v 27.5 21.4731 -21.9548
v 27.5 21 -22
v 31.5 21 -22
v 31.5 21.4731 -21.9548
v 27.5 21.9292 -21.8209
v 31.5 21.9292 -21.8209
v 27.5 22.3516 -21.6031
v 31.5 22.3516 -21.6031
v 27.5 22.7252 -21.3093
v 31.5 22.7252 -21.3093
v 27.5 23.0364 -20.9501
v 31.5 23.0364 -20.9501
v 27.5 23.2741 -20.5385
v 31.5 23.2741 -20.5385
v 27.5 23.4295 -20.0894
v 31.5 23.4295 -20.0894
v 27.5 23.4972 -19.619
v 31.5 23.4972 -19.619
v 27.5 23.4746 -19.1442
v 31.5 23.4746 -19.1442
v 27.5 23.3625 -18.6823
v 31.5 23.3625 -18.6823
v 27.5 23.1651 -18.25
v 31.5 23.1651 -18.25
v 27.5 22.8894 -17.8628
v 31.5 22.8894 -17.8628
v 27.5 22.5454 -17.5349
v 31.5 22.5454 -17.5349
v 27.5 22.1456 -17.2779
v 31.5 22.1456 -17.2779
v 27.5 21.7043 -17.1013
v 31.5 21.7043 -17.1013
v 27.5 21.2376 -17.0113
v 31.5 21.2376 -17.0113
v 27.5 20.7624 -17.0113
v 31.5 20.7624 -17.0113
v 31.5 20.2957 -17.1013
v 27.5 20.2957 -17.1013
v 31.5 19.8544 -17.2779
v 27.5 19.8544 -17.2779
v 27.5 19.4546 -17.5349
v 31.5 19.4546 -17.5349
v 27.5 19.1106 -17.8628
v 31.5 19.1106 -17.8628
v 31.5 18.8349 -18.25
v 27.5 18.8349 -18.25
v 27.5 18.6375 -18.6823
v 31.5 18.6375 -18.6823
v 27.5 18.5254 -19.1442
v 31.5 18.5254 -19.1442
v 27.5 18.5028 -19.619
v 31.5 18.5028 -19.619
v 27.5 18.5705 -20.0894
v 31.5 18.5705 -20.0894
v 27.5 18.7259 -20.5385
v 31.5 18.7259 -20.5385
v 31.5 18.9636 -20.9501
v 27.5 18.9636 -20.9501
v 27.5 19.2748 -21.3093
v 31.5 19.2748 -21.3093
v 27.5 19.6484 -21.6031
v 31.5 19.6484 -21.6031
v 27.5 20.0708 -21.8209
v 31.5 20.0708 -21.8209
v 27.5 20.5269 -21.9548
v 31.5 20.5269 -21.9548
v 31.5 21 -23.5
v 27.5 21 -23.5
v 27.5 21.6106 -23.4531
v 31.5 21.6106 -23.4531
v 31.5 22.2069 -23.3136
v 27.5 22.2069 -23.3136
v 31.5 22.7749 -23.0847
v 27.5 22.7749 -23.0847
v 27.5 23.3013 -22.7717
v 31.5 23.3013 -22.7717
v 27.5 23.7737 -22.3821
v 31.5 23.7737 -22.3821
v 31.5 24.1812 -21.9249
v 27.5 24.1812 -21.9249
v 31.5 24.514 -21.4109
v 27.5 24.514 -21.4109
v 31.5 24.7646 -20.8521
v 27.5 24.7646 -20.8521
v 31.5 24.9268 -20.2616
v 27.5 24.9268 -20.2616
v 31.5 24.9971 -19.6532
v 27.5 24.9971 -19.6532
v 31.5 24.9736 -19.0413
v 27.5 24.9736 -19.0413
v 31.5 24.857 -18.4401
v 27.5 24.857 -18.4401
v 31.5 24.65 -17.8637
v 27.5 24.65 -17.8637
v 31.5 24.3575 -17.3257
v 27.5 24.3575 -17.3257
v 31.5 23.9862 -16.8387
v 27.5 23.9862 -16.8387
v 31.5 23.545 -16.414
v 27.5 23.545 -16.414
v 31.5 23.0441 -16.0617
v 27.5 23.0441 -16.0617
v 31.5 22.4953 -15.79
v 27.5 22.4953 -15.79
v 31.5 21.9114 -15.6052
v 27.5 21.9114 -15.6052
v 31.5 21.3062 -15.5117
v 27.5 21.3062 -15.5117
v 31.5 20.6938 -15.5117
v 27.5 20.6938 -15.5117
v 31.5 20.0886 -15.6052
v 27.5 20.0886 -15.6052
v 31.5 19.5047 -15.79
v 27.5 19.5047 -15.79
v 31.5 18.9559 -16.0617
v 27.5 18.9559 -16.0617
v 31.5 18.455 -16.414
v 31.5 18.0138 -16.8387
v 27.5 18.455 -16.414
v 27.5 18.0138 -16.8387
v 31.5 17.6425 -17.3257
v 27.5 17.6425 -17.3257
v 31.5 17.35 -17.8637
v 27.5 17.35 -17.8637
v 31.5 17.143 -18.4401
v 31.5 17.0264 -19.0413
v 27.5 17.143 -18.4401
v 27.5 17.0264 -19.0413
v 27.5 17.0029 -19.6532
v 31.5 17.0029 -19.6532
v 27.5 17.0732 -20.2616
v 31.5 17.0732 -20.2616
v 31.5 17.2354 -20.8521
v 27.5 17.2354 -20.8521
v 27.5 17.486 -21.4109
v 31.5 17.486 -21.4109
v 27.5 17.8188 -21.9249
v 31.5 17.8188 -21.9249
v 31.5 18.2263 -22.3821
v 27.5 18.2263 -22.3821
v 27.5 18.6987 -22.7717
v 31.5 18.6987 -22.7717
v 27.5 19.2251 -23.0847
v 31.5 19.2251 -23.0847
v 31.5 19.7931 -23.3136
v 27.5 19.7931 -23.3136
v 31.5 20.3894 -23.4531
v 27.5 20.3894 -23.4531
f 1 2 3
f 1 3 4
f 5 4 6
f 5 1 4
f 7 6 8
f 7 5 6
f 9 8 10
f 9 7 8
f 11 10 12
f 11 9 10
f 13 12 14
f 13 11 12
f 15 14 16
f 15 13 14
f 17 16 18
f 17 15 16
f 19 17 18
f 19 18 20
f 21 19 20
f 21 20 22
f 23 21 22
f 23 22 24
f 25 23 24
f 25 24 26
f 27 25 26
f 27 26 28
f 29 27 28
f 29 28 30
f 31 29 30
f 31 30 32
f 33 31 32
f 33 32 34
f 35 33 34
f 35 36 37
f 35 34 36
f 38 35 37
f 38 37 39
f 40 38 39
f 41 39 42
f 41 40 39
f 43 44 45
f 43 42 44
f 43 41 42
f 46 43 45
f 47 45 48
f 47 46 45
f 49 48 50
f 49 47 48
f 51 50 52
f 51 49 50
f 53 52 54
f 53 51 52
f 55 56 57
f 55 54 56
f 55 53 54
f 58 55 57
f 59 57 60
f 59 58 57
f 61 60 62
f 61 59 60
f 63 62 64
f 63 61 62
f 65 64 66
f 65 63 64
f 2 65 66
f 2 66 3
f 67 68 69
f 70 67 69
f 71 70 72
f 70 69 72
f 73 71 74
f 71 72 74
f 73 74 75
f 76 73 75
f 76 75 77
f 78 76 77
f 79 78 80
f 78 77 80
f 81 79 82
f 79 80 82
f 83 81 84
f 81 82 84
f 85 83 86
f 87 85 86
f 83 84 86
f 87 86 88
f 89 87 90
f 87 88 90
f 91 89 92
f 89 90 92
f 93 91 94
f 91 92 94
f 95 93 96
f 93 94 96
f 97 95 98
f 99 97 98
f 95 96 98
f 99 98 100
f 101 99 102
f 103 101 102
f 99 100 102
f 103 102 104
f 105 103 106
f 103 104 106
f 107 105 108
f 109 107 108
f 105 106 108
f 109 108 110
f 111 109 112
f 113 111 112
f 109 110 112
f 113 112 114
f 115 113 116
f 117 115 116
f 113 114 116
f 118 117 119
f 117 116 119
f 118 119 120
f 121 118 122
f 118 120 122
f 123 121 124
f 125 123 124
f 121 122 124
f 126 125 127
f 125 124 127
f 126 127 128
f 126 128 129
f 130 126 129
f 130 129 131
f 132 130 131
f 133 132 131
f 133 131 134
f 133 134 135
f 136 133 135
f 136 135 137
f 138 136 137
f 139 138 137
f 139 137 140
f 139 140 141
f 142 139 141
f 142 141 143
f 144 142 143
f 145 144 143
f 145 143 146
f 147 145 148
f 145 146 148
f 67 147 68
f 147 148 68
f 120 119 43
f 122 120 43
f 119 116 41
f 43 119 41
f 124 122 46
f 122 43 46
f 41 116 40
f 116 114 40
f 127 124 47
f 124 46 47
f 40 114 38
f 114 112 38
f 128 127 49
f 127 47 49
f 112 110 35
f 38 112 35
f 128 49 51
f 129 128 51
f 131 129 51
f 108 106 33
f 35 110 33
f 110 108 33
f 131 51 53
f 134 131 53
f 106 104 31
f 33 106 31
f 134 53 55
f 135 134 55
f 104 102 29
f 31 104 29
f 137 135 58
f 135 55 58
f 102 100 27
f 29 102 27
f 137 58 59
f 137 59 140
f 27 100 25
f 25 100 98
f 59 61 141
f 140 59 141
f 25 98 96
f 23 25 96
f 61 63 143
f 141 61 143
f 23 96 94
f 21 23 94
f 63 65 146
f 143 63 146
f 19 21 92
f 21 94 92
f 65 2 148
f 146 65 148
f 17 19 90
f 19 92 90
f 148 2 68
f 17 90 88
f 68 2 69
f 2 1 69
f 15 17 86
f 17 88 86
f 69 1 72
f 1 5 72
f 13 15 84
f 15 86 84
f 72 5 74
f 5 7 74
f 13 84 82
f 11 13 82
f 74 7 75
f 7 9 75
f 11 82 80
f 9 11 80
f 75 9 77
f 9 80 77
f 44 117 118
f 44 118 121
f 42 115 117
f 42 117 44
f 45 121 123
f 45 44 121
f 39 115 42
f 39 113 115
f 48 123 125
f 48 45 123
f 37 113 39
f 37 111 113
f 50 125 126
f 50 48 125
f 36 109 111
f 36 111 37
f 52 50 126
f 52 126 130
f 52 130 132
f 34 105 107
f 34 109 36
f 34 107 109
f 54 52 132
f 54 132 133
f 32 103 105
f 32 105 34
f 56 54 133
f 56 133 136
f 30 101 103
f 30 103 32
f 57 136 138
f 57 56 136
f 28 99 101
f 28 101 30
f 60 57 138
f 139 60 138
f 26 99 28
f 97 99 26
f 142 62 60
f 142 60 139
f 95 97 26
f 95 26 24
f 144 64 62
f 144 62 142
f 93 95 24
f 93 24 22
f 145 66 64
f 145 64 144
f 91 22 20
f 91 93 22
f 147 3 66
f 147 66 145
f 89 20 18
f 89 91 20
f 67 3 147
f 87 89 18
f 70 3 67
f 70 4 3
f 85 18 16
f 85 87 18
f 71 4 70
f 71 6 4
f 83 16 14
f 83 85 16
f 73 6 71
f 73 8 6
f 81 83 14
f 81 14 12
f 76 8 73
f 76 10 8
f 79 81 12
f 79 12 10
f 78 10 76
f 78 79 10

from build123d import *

# Parameters (mm, degrees)
CYLINDER014_R     = 2.5
CYLINDER014_DEPTH = 10
CYLINDER015_R     = 4
CYLINDER015_DEPTH = 4


with BuildPart() as cylinder002:
    # Cylinder014 → Cylinder014 (new body)
    with BuildSketch(Plane(origin=(23.5, -39, -22), x_dir=(0, 0, -1), z_dir=(1, 0, 0))):
        Circle(CYLINDER014_R)
    extrude(amount=CYLINDER014_DEPTH)


with BuildPart() as bricksup002:
    # Cylinder015 → Cylinder015 (new body)
    with BuildSketch(Plane(origin=(26.5, -39, -22), x_dir=(0, 0, -1), z_dir=(1, 0, 0))):
        Circle(CYLINDER015_R)
    extrude(amount=CYLINDER015_DEPTH)

    # Cut008: cut Cylinder002
    add(cylinder002.part, mode=Mode.SUBTRACT)


with BuildPart() as bricksup002_1:
    # Cut008 placement: moved
    add(bricksup002.part.moved(Location((1, 60, 2.5))))


solid = bricksup002_1.part
